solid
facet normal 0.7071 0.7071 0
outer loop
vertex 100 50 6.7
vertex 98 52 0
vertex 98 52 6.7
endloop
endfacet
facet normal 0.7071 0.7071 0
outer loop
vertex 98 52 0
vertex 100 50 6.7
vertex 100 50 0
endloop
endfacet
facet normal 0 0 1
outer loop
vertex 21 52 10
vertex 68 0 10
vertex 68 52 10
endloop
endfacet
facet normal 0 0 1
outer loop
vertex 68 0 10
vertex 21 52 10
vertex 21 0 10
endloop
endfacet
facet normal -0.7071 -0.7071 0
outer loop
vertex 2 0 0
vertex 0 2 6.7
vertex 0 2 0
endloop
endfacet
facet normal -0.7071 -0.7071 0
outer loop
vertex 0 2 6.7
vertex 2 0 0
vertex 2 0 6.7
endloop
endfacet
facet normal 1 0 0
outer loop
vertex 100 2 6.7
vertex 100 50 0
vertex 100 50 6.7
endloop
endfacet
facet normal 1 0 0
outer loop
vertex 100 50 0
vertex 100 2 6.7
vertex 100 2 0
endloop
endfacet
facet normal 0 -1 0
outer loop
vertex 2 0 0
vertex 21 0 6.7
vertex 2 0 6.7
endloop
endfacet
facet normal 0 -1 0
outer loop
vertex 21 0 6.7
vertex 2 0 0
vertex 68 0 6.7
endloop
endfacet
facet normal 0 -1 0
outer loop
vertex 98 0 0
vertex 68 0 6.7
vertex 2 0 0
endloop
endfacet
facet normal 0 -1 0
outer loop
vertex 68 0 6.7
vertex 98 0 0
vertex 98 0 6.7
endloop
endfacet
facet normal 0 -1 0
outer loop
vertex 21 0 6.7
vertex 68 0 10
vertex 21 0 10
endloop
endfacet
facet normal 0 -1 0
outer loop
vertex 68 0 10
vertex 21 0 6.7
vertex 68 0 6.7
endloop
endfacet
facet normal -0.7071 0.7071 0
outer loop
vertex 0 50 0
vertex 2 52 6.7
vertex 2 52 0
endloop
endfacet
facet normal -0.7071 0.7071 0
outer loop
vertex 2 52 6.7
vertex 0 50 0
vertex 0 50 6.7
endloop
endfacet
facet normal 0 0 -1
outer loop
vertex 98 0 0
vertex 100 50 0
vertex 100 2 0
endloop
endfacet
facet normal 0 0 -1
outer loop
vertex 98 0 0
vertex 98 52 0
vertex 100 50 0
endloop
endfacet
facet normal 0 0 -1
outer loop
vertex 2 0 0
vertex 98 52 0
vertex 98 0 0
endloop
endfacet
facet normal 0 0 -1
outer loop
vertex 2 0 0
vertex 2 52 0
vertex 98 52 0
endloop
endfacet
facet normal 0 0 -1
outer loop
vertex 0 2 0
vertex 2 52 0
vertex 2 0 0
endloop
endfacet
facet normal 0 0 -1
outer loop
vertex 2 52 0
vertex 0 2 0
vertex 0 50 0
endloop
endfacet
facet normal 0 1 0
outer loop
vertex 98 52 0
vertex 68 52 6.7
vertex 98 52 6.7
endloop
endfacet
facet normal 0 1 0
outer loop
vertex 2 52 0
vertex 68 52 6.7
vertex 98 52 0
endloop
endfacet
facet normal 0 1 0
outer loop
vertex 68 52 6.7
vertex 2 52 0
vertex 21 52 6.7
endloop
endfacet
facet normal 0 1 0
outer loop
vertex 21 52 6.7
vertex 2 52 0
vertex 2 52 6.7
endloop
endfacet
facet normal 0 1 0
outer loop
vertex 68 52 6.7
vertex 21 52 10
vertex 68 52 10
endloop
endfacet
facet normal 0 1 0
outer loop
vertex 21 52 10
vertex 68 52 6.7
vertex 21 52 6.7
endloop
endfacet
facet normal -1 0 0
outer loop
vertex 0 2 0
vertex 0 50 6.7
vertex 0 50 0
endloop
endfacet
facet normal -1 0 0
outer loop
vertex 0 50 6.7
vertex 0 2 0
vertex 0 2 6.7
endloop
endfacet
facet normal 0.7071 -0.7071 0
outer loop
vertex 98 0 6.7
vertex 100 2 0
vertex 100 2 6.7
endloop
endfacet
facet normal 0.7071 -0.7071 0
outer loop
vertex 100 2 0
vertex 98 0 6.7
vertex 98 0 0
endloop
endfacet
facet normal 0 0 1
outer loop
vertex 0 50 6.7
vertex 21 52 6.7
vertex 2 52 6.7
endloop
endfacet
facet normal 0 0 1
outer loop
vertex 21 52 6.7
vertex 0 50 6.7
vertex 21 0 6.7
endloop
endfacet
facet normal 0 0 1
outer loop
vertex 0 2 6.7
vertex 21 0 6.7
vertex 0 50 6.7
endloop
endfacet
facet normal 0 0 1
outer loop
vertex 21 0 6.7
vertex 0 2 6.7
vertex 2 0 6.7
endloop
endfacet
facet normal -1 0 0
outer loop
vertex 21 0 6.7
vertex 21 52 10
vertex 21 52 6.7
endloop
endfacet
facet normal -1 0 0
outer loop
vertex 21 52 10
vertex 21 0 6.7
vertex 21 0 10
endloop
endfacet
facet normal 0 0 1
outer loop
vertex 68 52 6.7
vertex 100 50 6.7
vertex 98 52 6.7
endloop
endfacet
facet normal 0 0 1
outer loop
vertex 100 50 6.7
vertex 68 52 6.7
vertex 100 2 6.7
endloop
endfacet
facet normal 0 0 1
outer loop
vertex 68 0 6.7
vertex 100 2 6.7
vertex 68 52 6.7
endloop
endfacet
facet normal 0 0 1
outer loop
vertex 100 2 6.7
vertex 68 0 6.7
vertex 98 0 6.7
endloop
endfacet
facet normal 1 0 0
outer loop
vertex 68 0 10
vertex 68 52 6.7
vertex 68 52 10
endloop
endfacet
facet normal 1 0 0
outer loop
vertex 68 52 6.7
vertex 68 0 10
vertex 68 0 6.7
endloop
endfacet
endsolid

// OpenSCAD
$fn = 32;

// ----------------------------------------------------------------------
// Stepped bar: centerstep, 100 x 52 x 10/6.7 mm
// ----------------------------------------------------------------------

// --- parameters (mm) ---
bar_l = 100;              // bar length, X
bar_w = 52;               // bar width, Y
plate_t = 10;             // thickness of the thick zone, Z
thin_t = 6.7;             // thickness of the thin zone
corner_c = 2;             // corner chamfer of the bar
step_cut = 3.3;           // material removed from the thin zone
thick_from = 21;          // start of the thick middle zone
thick_to = 68;            // end of the thick middle zone
depth_1 = 3.3;            // depth of cut 1 from the top face
depth_2 = 3.3;            // depth of cut 2 from the top face

profile = [[2, 0], [98, 0], [100, 2], [100, 50], [98, 52], [2, 52], [0, 50], [0, 2]];  // primary outline, 8 points, counter clockwise
void_1 = [[-1, -1], [21, -1], [21, 53], [-1, 53]];  // thin left end, 4 points
void_2 = [[68, -1], [101, -1], [101, 53], [68, 53]];  // thin right end, 4 points

// --- the one profile operation ---
difference() {
  linear_extrude(height = plate_t) polygon(points = profile);
  translate([0, 0, plate_t - depth_1])
    linear_extrude(height = depth_1 + 1) polygon(points = void_1);
  translate([0, 0, plate_t - depth_2])
    linear_extrude(height = depth_2 + 1) polygon(points = void_2);
}
